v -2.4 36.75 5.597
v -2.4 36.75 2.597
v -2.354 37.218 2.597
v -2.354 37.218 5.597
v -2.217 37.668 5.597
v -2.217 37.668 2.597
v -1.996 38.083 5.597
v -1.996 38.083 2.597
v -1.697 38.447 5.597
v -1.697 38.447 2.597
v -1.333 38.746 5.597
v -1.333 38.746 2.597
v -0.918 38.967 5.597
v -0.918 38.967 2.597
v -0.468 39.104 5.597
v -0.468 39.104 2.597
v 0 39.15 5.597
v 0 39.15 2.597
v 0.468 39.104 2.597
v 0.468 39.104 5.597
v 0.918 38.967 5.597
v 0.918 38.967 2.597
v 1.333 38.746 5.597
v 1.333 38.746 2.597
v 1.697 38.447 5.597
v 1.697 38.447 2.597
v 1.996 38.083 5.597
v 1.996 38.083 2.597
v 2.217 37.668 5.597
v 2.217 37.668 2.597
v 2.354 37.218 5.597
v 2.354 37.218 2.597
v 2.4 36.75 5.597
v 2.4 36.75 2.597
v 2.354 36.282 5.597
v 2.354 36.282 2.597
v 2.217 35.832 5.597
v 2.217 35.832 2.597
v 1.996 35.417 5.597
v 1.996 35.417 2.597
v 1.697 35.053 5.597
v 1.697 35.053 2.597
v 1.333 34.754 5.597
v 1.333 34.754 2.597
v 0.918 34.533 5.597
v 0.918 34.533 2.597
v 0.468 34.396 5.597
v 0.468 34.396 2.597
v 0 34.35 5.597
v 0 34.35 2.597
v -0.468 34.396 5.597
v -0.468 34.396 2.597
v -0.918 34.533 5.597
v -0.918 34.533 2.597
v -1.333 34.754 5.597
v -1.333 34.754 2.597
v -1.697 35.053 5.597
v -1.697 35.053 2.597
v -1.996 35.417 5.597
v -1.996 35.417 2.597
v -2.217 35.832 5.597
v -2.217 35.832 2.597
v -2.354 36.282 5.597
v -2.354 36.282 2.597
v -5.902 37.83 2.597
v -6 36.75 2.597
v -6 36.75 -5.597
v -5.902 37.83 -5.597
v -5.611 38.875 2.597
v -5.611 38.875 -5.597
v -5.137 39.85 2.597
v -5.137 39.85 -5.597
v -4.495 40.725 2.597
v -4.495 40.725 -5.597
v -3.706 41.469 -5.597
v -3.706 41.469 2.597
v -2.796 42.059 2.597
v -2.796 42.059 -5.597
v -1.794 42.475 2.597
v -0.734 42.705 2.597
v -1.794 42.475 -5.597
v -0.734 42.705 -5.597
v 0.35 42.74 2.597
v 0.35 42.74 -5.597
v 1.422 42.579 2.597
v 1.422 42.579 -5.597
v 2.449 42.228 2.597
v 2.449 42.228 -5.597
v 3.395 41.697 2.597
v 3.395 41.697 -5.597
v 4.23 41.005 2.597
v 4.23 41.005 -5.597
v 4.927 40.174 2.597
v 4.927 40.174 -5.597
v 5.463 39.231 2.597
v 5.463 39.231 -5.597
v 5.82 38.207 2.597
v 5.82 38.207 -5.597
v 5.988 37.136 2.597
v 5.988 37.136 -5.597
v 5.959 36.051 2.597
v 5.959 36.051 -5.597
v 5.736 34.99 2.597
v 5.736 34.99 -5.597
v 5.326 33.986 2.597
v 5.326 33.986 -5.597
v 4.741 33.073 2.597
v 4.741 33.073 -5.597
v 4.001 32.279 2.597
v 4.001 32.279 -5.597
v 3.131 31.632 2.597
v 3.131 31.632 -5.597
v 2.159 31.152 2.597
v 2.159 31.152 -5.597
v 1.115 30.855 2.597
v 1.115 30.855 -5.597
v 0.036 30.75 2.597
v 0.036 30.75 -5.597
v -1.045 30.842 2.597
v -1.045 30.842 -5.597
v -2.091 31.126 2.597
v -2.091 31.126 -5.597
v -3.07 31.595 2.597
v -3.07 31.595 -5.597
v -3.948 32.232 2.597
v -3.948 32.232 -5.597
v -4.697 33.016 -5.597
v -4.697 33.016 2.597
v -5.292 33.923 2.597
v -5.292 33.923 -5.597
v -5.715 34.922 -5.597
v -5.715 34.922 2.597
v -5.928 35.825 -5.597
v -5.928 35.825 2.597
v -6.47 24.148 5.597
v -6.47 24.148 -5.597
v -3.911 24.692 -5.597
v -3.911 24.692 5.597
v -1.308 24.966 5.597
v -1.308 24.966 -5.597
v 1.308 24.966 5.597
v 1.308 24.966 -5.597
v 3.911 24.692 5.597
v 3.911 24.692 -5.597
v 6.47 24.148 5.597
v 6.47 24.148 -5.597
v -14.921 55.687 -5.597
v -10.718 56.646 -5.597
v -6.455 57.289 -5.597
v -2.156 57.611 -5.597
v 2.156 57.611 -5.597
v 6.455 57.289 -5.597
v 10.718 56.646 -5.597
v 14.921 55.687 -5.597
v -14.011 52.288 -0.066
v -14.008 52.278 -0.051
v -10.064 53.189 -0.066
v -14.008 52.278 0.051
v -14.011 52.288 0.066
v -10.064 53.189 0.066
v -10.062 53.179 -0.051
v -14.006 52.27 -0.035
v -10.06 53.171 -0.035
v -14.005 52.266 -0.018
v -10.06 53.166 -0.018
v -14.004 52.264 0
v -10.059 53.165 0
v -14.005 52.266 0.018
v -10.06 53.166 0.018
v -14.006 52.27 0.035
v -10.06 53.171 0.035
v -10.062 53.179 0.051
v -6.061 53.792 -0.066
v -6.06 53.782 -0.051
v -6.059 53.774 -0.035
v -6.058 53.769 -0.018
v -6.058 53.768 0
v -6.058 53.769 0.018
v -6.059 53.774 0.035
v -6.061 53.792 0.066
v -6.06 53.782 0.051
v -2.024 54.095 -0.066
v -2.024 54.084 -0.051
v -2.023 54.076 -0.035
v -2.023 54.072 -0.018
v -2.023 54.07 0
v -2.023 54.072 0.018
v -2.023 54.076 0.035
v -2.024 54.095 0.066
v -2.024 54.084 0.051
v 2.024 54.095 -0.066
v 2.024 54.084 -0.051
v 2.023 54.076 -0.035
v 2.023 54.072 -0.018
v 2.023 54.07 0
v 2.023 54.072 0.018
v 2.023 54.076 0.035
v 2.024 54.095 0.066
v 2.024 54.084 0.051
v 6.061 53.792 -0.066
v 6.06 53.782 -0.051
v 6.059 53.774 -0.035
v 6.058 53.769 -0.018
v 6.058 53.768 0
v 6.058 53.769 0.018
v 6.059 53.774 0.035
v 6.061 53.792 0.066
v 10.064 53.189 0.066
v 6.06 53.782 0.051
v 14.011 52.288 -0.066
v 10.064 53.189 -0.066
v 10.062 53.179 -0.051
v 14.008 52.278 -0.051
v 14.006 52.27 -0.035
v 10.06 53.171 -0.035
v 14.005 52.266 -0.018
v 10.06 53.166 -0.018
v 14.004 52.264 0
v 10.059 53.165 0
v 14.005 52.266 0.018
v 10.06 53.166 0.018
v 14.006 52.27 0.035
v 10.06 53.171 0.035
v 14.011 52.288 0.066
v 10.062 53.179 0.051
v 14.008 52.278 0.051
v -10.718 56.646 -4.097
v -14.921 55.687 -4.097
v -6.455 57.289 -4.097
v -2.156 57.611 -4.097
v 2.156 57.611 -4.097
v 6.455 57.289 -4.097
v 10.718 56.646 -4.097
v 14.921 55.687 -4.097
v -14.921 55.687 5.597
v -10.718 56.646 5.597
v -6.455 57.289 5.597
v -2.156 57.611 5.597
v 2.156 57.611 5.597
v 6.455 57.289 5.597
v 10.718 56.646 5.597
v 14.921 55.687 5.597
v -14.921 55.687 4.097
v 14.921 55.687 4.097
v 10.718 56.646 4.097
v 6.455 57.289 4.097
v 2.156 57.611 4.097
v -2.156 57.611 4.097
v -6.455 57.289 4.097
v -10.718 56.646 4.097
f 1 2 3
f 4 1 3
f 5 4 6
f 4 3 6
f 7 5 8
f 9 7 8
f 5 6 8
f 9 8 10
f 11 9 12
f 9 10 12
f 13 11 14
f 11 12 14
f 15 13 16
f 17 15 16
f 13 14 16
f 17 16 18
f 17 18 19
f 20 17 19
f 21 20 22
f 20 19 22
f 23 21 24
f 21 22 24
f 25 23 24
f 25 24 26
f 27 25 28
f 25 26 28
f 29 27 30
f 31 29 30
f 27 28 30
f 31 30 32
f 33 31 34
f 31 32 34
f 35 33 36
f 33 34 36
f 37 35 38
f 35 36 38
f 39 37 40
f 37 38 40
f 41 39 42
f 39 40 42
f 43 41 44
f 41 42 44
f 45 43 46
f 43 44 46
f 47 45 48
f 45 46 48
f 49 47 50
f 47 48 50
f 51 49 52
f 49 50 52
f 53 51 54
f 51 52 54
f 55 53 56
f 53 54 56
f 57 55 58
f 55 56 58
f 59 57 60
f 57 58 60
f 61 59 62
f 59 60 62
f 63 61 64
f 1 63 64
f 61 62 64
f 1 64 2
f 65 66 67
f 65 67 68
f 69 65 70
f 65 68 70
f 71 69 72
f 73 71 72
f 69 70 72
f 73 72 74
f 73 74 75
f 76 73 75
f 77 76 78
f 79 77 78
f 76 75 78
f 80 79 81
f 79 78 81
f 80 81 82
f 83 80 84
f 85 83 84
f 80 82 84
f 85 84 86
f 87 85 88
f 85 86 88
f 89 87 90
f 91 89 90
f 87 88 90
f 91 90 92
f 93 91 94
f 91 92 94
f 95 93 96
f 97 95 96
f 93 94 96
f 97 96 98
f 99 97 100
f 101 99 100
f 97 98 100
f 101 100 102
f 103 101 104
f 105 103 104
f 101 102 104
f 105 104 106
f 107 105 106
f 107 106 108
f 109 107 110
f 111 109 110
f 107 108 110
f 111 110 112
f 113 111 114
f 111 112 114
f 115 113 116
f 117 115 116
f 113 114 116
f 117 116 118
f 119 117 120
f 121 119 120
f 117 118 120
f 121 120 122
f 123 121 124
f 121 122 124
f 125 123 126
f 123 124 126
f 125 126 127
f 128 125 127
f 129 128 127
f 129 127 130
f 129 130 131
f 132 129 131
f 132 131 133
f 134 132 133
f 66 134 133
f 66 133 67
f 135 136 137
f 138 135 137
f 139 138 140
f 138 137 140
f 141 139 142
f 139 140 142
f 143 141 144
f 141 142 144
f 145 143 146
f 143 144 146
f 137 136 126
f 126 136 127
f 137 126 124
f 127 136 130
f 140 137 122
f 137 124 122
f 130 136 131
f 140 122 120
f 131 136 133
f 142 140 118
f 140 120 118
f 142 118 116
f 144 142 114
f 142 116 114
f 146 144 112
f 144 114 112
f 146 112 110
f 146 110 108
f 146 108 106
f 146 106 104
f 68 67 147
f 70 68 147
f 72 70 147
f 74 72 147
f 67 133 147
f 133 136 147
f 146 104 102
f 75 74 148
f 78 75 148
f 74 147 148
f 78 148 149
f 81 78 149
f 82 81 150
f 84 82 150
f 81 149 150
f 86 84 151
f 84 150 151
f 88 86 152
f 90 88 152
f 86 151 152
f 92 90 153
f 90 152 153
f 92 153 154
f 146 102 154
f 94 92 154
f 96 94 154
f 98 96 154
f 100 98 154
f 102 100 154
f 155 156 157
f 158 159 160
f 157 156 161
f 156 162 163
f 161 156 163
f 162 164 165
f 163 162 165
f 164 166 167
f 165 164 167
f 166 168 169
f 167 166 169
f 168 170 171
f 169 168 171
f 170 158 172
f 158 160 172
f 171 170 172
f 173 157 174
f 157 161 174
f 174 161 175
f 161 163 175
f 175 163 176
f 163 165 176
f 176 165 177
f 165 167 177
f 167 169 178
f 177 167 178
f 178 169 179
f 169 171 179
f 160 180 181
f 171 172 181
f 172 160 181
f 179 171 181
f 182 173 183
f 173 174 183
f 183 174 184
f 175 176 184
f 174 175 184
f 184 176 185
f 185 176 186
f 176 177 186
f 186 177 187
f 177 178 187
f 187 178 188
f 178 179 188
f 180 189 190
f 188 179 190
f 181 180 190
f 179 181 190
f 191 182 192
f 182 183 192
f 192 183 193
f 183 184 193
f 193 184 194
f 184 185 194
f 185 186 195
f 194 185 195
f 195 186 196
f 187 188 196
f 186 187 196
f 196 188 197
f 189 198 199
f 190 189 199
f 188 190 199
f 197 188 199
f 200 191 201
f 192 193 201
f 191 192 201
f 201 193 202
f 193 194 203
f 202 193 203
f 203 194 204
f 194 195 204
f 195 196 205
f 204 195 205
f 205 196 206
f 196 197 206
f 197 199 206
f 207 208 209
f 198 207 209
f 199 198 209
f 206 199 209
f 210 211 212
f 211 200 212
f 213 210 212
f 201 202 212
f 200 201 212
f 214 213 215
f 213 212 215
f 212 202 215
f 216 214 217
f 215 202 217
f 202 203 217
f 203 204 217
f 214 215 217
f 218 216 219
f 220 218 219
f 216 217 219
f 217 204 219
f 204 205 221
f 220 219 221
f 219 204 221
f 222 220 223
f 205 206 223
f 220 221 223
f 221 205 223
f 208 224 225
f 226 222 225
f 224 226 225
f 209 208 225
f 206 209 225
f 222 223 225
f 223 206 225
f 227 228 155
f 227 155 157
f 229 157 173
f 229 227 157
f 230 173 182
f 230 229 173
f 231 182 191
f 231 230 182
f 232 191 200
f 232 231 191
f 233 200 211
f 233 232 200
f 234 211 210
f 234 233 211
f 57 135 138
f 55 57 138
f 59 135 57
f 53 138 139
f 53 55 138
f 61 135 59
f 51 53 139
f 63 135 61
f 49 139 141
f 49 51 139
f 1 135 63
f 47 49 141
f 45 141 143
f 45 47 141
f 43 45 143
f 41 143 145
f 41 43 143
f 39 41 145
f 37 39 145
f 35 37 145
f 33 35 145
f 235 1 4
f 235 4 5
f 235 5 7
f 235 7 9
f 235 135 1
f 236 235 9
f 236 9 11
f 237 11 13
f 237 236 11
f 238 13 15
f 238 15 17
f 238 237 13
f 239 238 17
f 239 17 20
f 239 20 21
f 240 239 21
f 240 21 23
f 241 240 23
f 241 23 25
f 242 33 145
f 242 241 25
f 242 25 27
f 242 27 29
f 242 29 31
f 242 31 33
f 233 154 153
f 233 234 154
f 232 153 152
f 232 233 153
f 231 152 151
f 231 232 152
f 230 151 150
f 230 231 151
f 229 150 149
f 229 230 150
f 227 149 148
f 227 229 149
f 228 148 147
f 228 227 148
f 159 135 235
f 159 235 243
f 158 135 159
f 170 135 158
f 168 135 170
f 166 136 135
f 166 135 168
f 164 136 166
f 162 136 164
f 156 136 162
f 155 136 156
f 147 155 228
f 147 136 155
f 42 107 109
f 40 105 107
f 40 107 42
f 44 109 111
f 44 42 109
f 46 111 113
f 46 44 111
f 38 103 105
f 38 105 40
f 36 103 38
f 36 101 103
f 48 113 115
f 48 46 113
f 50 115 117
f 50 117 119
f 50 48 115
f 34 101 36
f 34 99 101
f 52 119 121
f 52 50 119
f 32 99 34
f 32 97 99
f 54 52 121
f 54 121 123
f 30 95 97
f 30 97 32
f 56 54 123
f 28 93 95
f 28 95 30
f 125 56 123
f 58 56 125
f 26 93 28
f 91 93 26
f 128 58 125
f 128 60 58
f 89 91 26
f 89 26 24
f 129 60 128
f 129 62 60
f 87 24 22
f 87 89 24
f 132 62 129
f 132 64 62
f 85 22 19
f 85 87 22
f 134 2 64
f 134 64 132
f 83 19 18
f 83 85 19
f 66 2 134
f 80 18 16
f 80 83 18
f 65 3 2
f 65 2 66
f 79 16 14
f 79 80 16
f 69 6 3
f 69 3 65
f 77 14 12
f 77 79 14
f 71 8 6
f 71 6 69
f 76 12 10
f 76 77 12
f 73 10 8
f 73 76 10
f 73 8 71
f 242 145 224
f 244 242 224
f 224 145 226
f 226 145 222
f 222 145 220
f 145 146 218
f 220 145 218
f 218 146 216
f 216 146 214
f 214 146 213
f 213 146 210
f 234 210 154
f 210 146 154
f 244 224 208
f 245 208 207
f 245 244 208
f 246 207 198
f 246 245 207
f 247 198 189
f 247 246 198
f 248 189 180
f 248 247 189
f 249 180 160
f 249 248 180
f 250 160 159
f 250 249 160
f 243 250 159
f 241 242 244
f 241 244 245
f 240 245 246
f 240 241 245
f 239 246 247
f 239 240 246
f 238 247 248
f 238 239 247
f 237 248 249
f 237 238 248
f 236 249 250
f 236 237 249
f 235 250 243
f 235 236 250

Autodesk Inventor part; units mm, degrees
ref_plane "YZ Plane" through (0, 0, 0) normal (1, 0, 0) x (0, 1, 0)
ref_plane "XZ Plane" through (0, 0, 0) normal (0, 1, 0) x (-1, 0, 0)
sketch "Sketch1" plane through (0, 0, 0) normal (0, 0, 1) x (1, 0, 0)
  circle A0 centre (0, 0) radius 59.2469 construction
  line L0 (0, 0) -> (59.2469, 0)
  line L1 (0, 0) -> (59.2469, 4.025)
  line L2 (59.2469, 0) -> (59.2469, 4.025)
  circle A1 centre (0, 0) radius 75
  point P0 (56.8, 0)
  dimension "d56" = 59.2469
  dimension "d57" = 4.025
  dimension "d400" = 75
  dimension "d495" = 2.5
  dimension "d496" = 8
  dimension "d531" = 5.5
  dimension "d532" = 5.5
  dimension "d533" = 5.5
  dimension "d537" = 24.5
  dimension "d538" = 3
  dimension "d543" = 5.5
  dimension "d549" = 3
  dimension "d550" = 3
  dimension "d567" = 5.5
  dimension "d568" = 5.5
sketch "Sketch7" plane through (0, 0, 0) normal (0, 1, 0) x (-1, 0, 0)
  line L0 (0, 0) -> (0, 61.9844)
  line L1 (0, 0) -> (-59.2469, 0) construction
  line L2 (0, 61.9844) -> (-59.2469, 0) construction
  line L3 (0, 61.9844) -> (-64.8494, 0) construction
  line L4 (0, 61.9844) -> (-58.9939, -5.5968) construction
  line L5 (0, 0) -> (0, -61.9844)
  line L6 (0, -61.9844) -> (-59.2469, 0) construction
  line L7 (0, -61.9844) -> (-64.8494, 0) construction
  line L8 (0, -61.9844) -> (-58.9939, 5.5968) construction
  line L9 (-58.9939, 5.5968) -> (-64.8494, 0) construction
  line L10 (-54.1083, 0) -> (-62.8579, -8.363) construction
  line L11 (-54.1083, 0) -> (-38.773, -14.6579) construction
  line L12 (0, -94.3812) -> (0, 132.3969) projected
  line L13 (-75, -5.9919) -> (-75, 6.008)
  line L14 (105, 0) -> (-105, 0) projected
  line L15 (-62.0481, 2.6775) -> (-56.4456, -2.6775) construction
  line L16 (-56.4456, 2.6775) -> (-62.0481, -2.6775) construction
  line L17 (-26.151, -15.9303) -> (-40.3783, -15.9303) construction
  line L18 (-40.3783, -15.9303) -> (-40.3783, -12.7539) construction
  line L19 (-40.3783, -12.7539) -> (-26.151, -12.7539) construction
  line L20 (-26.151, -12.7539) -> (-26.151, -15.9303) construction
  point P0 (-75, 0)
  dimension "Roller_Side_difference" = -0.0002
  dimension "d90" = 61.9844
  dimension "d201" = 75
  dimension "d343" = 92.587
  dimension "d344" = 92.588
  dimension "d367" = 8.1
sketch "Roller1" plane through (0, 0, 0) normal (0, 1, 0) x (-1, 0, 0)
  line L0 (0, 61.9844) -> (-58.9939, -5.5968) construction
  line L1 (0, 61.9844) -> (-64.8494, 0) construction
  line L2 (-54.1083, 0) -> (-38.773, -14.6579) construction
  line L3 (0, -61.9844) -> (-64.8494, 0) construction
  line L4 (-54.0606, 0.0927) -> (-58.9462, -5.5041)
  line L5 (-58.9462, -5.5041) -> (-64.7589, 0.0519)
  line L6 (-64.7589, 0.0519) -> (-59.3884, 5.1851)
  line L7 (-59.3884, 5.1851) -> (-54.0606, 0.0927)
  line L8 (-56.0019, 1.9482) -> (-61.1299, -3.4168)
  line L9 (-61.8526, -2.7261) -> (-56.7246, 2.639)
  point P0 (0, 0)
  dimension "d345" = 0.025
  dimension "d346" = 0.025
  dimension "d347" = 0.1
  dimension "d348" = 0.1
  dimension "d349" = 272.588
  dimension "d350" = 272.587
  dimension "d617" = 0.9997
sketch "Roller2" plane through (0, 0, 0) normal (0, 1, 0) x (-1, 0, 0)
  line L0 (0, -61.9844) -> (-58.9939, 5.5968) construction
  line L1 (-54.1083, 0) -> (-62.8579, -8.363) construction
  line L2 (0, -61.9844) -> (-64.8494, 0) construction
  line L3 (0, 61.9844) -> (-64.8494, 0) construction
  line L4 (-58.9956, 5.5606) -> (-54.1429, 0.0016)
  line L5 (-54.1429, 0.0016) -> (-59.4789, -5.0987)
  line L6 (-59.4789, -5.0987) -> (-64.8132, 0)
  line L7 (-64.8132, 0) -> (-58.9956, 5.5606)
  line L8 (-61.9044, 2.7803) -> (-56.8109, -2.5486)
  line L9 (-61.1815, 3.4713) -> (-56.088, -1.8576)
  point P0 (0, 0)
  dimension "d351" = 0.025
  dimension "d352" = 0.025
  dimension "d354" = 0.025
  dimension "d355" = 92.587
  dimension "d356" = 92.588
  dimension "d370" = 0.025
  dimension "d371" = 1
sketch "Sketch22" plane through (0, 0, 0) normal (0, 1, 0) x (-1, 0, 0)
  line L0 (-31.756, 8.0215) -> (-17.5287, 8.0215) construction
  line L1 (-17.5287, 8.0215) -> (-17.5287, 4.8451) construction
  line L2 (-17.5287, 4.8451) -> (-31.756, 4.8451) construction
  line L3 (-31.756, 4.8451) -> (-31.756, 8.0215) construction
  point P0 (0, 0)
  dimension "Roller_Side_difference" = -0.0002
sketch "Sketch2" plane through (0, 0, 0) normal (0, 1, 0) x (-1, 0, 0)
  line L0 (0, 0) -> (0, 59.2469) construction
  line L1 (0, 0) -> (-59.2469, 0) projected
  line L2 (0, 0) -> (0, -59.2469)
  line L3 (0, -59.2469) -> (-59.2469, 0) construction
  line L4 (0, 59.2469) -> (-59.2469, 0) construction
  line L5 (-50.4879, 53.555) -> (0, 59.2469) construction
  line L6 (-29.7354, 7.189) -> (0, 59.2469) construction
  line L7 (-29.7354, 7.189) -> (0, -59.2469) construction
  line L8 (-48.8381, -26.254) -> (0, -59.2469) construction
  point P0 (-40.4258, 18.8211)
sketch "Sketch23" plane through (0, 0, 0) normal (0, 1, 0) x (-1, 0, 0)
  line L0 (0, -61.9844) -> (-58.9939, 5.5968) construction
  line L1 (0, -61.9844) -> (-64.8494, 0) construction
  line L2 (0, 61.9844) -> (-58.9939, -5.5968) construction
  line L3 (-58.9939, 5.5968) -> (-64.8494, 0) construction
  line L4 (0, 61.9844) -> (-64.8494, 0) construction
  line L5 (-58.9939, 5.5968) -> (-58.9939, -5.5968) construction
  line L6 (105, 0) -> (-105, 0) projected
  line L7 (-57.6514, 4.0968) -> (-54.1326, 0.0658)
  line L8 (-54.1326, -0.0658) -> (-57.6514, -4.0968)
  line L9 (-60.5995, 4.0968) -> (-64.81, 0.0723)
  line L10 (-64.81, -0.0723) -> (-60.5995, -4.0968)
  arc A0 (-64.81, 0.0723) -> (-64.81, -0.0723) centre (-64.7409, 0) ccw
  arc A1 (-54.1326, -0.0658) -> (-54.1326, 0.0658) centre (-54.2079, 0) ccw
  line L11 (-57.6514, 4.0968) -> (-57.6514, 5.5968)
  line L12 (-57.6514, 5.5968) -> (-25, 5.5968)
  line L13 (-25, 5.5968) -> (-25, -5.5968)
  line L14 (-25, -5.5968) -> (-57.6514, -5.5968)
  line L15 (-57.6514, -5.5968) -> (-57.6514, -4.0968)
  line L16 (-60.5995, 4.0968) -> (-60.5995, 5.5968)
  line L17 (-60.5995, 5.5968) -> (-75, 5.5968)
  line L18 (-75, 5.5968) -> (-75, -5.5968)
  line L19 (-60.5995, -4.0968) -> (-60.5995, -5.5968)
  line L20 (-60.5995, -5.5968) -> (-75, -5.5968)
  line L21 (-58.9939, 5.5968) -> (-58.9939, 5.5968)
  line L22 (-58.9939, -5.5968) -> (-58.9939, -5.5968)
  line L23 (0, -94.3812) -> (0, 132.3969) projected
  line L24 (-64.8856, 0) -> (-75, 0)
  point P0 (0, 0)
  point P1 (-54.0752, 0)
  point P2 (-64.8409, 0)
  point P3 (-75, 0)
  dimension "d378" = 90
  dimension "d379" = 0.1
  dimension "d380" = 0.025
  dimension "d381" = 0.025
  dimension "d382" = 0.025
  dimension "d383" = 0.025
  dimension "d384" = 11.1935
  dimension "d385" = 0
  dimension "d386" = 0
  dimension "d391" = 25
  dimension "d392" = 75
  dimension "d393" = 1.5
  dimension "d394" = 1.5
  dimension "d395" = 1.5
  dimension "d396" = 1.5
revolve "RevRoller1" [suppressed]
fillet "Fillet1" [suppressed]
sketch "Sketch48" plane through (56.7246, 0, 2.639) normal (-0.691, 0, 0.7229) x (0.7229, 0, 0.691)
  line L0 (-2.5, 0.25) -> (2.5, 0.25)
  line L1 (2.5, 0.25) -> (2.5, -0.25)
  line L2 (2.5, -0.25) -> (-2.5, -0.25)
  line L3 (-2.5, -0.25) -> (-2.5, 0.25)
  line L4 (-2.5, 0.25) -> (2.5, -0.25) construction
  line L5 (2.5, 0.25) -> (-2.5, -0.25) construction
  line L6 (-0.25, -2.5) -> (0.25, -2.5)
  line L7 (0.25, -2.5) -> (0.25, 2.5)
  line L8 (0.25, 2.5) -> (-0.25, 2.5)
  line L9 (-0.25, 2.5) -> (-0.25, -2.5)
  line L10 (-0.25, -2.5) -> (0.25, 2.5) construction
  line L11 (0.25, -2.5) -> (-0.25, 2.5) construction
  point P0 (-42.8293, 0)
  point P1 (0, 0)
  point P2 (-0.25, 0.25)
  point P3 (-0.25, -0.25)
  point P4 (0.25, -0.25)
  point P5 (0.25, 0.25)
  dimension "d621" = 5
  dimension "d622" = 0.5
  dimension "d623" = 0.5
  dimension "d624" = 5
extrude "Extrusion39" [suppressed]
sketch "Sketch40" plane through (0, 0, -5.231) normal (0, 0, -1) x (-1, 0, 0)
  circle A0 centre (53.5, 0) radius 2.75 projected
  circle A1 centre (0, 0) radius 53.5 projected
  point P0 (53.4293, 2.7491)
  point P1 (53.4293, -2.7491)
  dimension "d585" = 8
  dimension "d587" = 1.75
  dimension "d589" = 3
  dimension "d592" = 2
  dimension "d593" = 12
  dimension "d594" = 12
  dimension "d611" = 360
pattern_circular "Circular Pattern13" [suppressed]
feature "Move Body7" [suppressed]
revolve "Revolution13" [suppressed]
fillet "Fillet3" [suppressed]
pattern_circular "Circular Pattern14" [suppressed]
feature "Move Body6" [suppressed]
revolve "Revolution14" add sketch "Sketch23" angle 360 about axis through (0, 0, -10) along (0, 0, 1) contours A1 L7 L11 L12 L13 L6 | L6 L13 L14 L15 L8 A1
revolve "OuterRim_Top2" [suppressed]
revolve "OuterRim_Bottom2" [suppressed]
ref_plane "Work Plane8" through (0, 0, 20) normal (0, 0, 1) x (1, 0, 0)
sketch "Sketch49" plane through (0, 0, 20) normal (0, 0, 1) x (1, 0, 0)
  circle A0 centre (0, 0) radius 75 projected
  circle A1 centre (0, 0) radius 60.5995 projected
  circle A2 centre (0, 0) radius 57.6514 projected
  circle A3 centre (0, 0) radius 25 projected
  circle A4 centre (0, 0) radius 69
  circle A5 centre (0, 0) radius 36.75
  point P0 (0, 69)
  point P1 (0, 36.75)
  point P2 (-40.5572, 55.8222)
  dimension "d629" = 69
  dimension "d630" = 73.5
  dimension "d649" = 36
sketch "Sketch50" plane through (0, 0, 5.5968) normal (0, 0, 1) x (1, 0, 0)
  point P0 (0, 0)
  point P1 (0, 69)
sketch "Sketch51" plane through (0, 0, -5.5968) normal (0, 0, -1) x (-1, 0, 0)
  circle A0 centre (0, 0) radius 75 projected
  circle A1 centre (0, 69) radius 2.75
  circle A2 centre (0, 69) radius 1.5
  circle A3 centre (-40.5572, 55.8222) radius 3.5
  circle A4 centre (-40.5572, 55.8222) radius 2
  dimension "d633" = 36
  dimension "d635" = 5.5
  dimension "d636" = 3
  dimension "d637" = 7
  dimension "d638" = 4
extrude "Extrusion40" [suppressed]
extrude "Extrusion41" [suppressed]
extrude "Extrusion42" [suppressed]
extrude "Extrusion43" [suppressed]
sketch "Sketch52" plane through (0, 0, 5.5968) normal (0, 0, 1) x (1, 0, 0)
  circle A0 centre (0, 69) radius 1.5
  circle A1 centre (-40.5572, 55.8222) radius 2
  line L0 (2.75, 67.4123) -> (0, 65.8246)
  line L1 (0, 65.8246) -> (-2.75, 67.4123)
  line L2 (-2.75, 67.4123) -> (-2.75, 70.5877)
  line L3 (-2.75, 70.5877) -> (0, 72.1754)
  line L4 (0, 72.1754) -> (2.75, 70.5877)
  line L5 (2.75, 70.5877) -> (2.75, 67.4123)
  circle A2 centre (0, 0) radius 75 projected
  line L6 (-39.2656, 58.7231) -> (-37.3992, 56.1541)
  line L7 (-36.5379, 56.2446) -> (-38.1817, 52.5526)
  line L8 (-38.1817, 52.5526) -> (-42.201, 52.1301)
  line L9 (-42.201, 52.1301) -> (-44.5765, 55.3997)
  line L10 (-44.5765, 55.3997) -> (-42.9327, 59.0918)
  line L11 (-42.9327, 59.0918) -> (-38.9134, 59.5142)
  line L12 (-38.9134, 59.5142) -> (-36.5379, 56.2446)
  dimension "d651" = 3
  dimension "d652" = 4
  dimension "d655" = 36
  dimension "d657" = 7
  dimension "d658" = 5.5
extrude "Extrusion44" [suppressed]
extrude "Extrusion45" [suppressed]
extrude "Extrusion46" [suppressed]
extrude "Extrusion47" [suppressed]
pattern_circular "Circular Pattern32" [suppressed]
pattern_circular "Circular Pattern33" [suppressed]
sketch "Sketch57" plane through (0, 0, -5.5968) normal (0, 0, -1) x (-1, 0, 0)
  line L0 (-3.175, 39.925) -> (3.175, 39.925)
  line L1 (3.175, 39.925) -> (3.175, 33.575)
  line L2 (3.175, 33.575) -> (-3.175, 33.575)
  line L3 (-3.175, 33.575) -> (-3.175, 39.925)
  line L4 (-3.175, 39.925) -> (3.175, 33.575) construction
  line L5 (3.175, 39.925) -> (-3.175, 33.575) construction
  ellipse E0 centre (0, 36.75) end of major axis (6, 36.75) minor radius 6
  circle A0 centre (0, 36.75) radius 2.4
  point P0 (0, 0)
  dimension "d694" = 6.35
  dimension "d695" = 6.35
  dimension "d696" = 6
  dimension "d697" = 6
  dimension "d705" = 4.8
extrude "Extrusion50" cut sketch "Sketch57" against normal blind 11.194 contours A0
extrude "Extrusion51" cut sketch "Sketch57" against normal blind 8.194 contours L0 L1 L2 L3 | E0 | A0
pattern_circular "Circular Pattern34" count 6 over 360 about axis through (0, 0, -4.8468) along (0, 0, 1) of "Extrusion50", "Extrusion51"
ref_plane "Work Plane9" through (0, 0, -25) normal (0, 0, 1) x (1, 0, 0)
sketch "Sketch58" plane through (0, 0, -25) normal (0, 0, 1) x (1, 0, 0)
  circle A0 centre (0, 0) radius 78.9709
  line L0 (0, 0) -> (0, 88.7109)
  line L1 (0, 0) -> (29.2038, 108.9901)
  line L2 (0, 0) -> (-27.1115, 101.1815)
  point P0 (-20.4392, 76.28)
  point P1 (20.4392, 76.28)
  dimension "d707" = 15
  dimension "d708" = 15
extrude "Extrusion52" cut sketch "Sketch58" along normal through all contours A0 L2 L1
equation "\"Roller_Side_difference\" = -0.000942deg"
equation "\"Cycloid_Top_Plate_Fasner_Inner\" = 61.25"
equation "\"Cycloid_Top_Plate_Fasner_Outer\" = 85.75"
equation "\"Roller_Hole_Radius\" = 1"
equation "\"Distance_To_Bearing\" = 85.74529"
equation "\"d514\" = 0.2"
equation "\"Machine_Screw_4mm_Head_Dept\" = 4"
equation "\"Machine_Screw_4mm_Head_Diameter\" = 7"
equation "\"Machine_Screw_4mm_HexNut_Thickness\" = 3"
equation "\"Machine_Screw_4mm_HexNut_Width\" = 6.9"
equation "\"Machine_Screw_4mm_Length\" = 8"
equation "\"Fastner_4mm_Hex_Nut_Width\" = 7"
equation "\"Fastner_4mm_Screw_Diameter\" = 4"
equation "\"Fastner_4mm_Screw_Head_Diameter\" = 7"
equation "\"Fastner_4mm_Hex_Nut_Hole_Dept\" = 3.19352"
equation "\"Fastner_4mm_Screw_Head_Hole_Dept\" = 4"
properties part number "Sectio_Right_OuterBearing_TBS"
